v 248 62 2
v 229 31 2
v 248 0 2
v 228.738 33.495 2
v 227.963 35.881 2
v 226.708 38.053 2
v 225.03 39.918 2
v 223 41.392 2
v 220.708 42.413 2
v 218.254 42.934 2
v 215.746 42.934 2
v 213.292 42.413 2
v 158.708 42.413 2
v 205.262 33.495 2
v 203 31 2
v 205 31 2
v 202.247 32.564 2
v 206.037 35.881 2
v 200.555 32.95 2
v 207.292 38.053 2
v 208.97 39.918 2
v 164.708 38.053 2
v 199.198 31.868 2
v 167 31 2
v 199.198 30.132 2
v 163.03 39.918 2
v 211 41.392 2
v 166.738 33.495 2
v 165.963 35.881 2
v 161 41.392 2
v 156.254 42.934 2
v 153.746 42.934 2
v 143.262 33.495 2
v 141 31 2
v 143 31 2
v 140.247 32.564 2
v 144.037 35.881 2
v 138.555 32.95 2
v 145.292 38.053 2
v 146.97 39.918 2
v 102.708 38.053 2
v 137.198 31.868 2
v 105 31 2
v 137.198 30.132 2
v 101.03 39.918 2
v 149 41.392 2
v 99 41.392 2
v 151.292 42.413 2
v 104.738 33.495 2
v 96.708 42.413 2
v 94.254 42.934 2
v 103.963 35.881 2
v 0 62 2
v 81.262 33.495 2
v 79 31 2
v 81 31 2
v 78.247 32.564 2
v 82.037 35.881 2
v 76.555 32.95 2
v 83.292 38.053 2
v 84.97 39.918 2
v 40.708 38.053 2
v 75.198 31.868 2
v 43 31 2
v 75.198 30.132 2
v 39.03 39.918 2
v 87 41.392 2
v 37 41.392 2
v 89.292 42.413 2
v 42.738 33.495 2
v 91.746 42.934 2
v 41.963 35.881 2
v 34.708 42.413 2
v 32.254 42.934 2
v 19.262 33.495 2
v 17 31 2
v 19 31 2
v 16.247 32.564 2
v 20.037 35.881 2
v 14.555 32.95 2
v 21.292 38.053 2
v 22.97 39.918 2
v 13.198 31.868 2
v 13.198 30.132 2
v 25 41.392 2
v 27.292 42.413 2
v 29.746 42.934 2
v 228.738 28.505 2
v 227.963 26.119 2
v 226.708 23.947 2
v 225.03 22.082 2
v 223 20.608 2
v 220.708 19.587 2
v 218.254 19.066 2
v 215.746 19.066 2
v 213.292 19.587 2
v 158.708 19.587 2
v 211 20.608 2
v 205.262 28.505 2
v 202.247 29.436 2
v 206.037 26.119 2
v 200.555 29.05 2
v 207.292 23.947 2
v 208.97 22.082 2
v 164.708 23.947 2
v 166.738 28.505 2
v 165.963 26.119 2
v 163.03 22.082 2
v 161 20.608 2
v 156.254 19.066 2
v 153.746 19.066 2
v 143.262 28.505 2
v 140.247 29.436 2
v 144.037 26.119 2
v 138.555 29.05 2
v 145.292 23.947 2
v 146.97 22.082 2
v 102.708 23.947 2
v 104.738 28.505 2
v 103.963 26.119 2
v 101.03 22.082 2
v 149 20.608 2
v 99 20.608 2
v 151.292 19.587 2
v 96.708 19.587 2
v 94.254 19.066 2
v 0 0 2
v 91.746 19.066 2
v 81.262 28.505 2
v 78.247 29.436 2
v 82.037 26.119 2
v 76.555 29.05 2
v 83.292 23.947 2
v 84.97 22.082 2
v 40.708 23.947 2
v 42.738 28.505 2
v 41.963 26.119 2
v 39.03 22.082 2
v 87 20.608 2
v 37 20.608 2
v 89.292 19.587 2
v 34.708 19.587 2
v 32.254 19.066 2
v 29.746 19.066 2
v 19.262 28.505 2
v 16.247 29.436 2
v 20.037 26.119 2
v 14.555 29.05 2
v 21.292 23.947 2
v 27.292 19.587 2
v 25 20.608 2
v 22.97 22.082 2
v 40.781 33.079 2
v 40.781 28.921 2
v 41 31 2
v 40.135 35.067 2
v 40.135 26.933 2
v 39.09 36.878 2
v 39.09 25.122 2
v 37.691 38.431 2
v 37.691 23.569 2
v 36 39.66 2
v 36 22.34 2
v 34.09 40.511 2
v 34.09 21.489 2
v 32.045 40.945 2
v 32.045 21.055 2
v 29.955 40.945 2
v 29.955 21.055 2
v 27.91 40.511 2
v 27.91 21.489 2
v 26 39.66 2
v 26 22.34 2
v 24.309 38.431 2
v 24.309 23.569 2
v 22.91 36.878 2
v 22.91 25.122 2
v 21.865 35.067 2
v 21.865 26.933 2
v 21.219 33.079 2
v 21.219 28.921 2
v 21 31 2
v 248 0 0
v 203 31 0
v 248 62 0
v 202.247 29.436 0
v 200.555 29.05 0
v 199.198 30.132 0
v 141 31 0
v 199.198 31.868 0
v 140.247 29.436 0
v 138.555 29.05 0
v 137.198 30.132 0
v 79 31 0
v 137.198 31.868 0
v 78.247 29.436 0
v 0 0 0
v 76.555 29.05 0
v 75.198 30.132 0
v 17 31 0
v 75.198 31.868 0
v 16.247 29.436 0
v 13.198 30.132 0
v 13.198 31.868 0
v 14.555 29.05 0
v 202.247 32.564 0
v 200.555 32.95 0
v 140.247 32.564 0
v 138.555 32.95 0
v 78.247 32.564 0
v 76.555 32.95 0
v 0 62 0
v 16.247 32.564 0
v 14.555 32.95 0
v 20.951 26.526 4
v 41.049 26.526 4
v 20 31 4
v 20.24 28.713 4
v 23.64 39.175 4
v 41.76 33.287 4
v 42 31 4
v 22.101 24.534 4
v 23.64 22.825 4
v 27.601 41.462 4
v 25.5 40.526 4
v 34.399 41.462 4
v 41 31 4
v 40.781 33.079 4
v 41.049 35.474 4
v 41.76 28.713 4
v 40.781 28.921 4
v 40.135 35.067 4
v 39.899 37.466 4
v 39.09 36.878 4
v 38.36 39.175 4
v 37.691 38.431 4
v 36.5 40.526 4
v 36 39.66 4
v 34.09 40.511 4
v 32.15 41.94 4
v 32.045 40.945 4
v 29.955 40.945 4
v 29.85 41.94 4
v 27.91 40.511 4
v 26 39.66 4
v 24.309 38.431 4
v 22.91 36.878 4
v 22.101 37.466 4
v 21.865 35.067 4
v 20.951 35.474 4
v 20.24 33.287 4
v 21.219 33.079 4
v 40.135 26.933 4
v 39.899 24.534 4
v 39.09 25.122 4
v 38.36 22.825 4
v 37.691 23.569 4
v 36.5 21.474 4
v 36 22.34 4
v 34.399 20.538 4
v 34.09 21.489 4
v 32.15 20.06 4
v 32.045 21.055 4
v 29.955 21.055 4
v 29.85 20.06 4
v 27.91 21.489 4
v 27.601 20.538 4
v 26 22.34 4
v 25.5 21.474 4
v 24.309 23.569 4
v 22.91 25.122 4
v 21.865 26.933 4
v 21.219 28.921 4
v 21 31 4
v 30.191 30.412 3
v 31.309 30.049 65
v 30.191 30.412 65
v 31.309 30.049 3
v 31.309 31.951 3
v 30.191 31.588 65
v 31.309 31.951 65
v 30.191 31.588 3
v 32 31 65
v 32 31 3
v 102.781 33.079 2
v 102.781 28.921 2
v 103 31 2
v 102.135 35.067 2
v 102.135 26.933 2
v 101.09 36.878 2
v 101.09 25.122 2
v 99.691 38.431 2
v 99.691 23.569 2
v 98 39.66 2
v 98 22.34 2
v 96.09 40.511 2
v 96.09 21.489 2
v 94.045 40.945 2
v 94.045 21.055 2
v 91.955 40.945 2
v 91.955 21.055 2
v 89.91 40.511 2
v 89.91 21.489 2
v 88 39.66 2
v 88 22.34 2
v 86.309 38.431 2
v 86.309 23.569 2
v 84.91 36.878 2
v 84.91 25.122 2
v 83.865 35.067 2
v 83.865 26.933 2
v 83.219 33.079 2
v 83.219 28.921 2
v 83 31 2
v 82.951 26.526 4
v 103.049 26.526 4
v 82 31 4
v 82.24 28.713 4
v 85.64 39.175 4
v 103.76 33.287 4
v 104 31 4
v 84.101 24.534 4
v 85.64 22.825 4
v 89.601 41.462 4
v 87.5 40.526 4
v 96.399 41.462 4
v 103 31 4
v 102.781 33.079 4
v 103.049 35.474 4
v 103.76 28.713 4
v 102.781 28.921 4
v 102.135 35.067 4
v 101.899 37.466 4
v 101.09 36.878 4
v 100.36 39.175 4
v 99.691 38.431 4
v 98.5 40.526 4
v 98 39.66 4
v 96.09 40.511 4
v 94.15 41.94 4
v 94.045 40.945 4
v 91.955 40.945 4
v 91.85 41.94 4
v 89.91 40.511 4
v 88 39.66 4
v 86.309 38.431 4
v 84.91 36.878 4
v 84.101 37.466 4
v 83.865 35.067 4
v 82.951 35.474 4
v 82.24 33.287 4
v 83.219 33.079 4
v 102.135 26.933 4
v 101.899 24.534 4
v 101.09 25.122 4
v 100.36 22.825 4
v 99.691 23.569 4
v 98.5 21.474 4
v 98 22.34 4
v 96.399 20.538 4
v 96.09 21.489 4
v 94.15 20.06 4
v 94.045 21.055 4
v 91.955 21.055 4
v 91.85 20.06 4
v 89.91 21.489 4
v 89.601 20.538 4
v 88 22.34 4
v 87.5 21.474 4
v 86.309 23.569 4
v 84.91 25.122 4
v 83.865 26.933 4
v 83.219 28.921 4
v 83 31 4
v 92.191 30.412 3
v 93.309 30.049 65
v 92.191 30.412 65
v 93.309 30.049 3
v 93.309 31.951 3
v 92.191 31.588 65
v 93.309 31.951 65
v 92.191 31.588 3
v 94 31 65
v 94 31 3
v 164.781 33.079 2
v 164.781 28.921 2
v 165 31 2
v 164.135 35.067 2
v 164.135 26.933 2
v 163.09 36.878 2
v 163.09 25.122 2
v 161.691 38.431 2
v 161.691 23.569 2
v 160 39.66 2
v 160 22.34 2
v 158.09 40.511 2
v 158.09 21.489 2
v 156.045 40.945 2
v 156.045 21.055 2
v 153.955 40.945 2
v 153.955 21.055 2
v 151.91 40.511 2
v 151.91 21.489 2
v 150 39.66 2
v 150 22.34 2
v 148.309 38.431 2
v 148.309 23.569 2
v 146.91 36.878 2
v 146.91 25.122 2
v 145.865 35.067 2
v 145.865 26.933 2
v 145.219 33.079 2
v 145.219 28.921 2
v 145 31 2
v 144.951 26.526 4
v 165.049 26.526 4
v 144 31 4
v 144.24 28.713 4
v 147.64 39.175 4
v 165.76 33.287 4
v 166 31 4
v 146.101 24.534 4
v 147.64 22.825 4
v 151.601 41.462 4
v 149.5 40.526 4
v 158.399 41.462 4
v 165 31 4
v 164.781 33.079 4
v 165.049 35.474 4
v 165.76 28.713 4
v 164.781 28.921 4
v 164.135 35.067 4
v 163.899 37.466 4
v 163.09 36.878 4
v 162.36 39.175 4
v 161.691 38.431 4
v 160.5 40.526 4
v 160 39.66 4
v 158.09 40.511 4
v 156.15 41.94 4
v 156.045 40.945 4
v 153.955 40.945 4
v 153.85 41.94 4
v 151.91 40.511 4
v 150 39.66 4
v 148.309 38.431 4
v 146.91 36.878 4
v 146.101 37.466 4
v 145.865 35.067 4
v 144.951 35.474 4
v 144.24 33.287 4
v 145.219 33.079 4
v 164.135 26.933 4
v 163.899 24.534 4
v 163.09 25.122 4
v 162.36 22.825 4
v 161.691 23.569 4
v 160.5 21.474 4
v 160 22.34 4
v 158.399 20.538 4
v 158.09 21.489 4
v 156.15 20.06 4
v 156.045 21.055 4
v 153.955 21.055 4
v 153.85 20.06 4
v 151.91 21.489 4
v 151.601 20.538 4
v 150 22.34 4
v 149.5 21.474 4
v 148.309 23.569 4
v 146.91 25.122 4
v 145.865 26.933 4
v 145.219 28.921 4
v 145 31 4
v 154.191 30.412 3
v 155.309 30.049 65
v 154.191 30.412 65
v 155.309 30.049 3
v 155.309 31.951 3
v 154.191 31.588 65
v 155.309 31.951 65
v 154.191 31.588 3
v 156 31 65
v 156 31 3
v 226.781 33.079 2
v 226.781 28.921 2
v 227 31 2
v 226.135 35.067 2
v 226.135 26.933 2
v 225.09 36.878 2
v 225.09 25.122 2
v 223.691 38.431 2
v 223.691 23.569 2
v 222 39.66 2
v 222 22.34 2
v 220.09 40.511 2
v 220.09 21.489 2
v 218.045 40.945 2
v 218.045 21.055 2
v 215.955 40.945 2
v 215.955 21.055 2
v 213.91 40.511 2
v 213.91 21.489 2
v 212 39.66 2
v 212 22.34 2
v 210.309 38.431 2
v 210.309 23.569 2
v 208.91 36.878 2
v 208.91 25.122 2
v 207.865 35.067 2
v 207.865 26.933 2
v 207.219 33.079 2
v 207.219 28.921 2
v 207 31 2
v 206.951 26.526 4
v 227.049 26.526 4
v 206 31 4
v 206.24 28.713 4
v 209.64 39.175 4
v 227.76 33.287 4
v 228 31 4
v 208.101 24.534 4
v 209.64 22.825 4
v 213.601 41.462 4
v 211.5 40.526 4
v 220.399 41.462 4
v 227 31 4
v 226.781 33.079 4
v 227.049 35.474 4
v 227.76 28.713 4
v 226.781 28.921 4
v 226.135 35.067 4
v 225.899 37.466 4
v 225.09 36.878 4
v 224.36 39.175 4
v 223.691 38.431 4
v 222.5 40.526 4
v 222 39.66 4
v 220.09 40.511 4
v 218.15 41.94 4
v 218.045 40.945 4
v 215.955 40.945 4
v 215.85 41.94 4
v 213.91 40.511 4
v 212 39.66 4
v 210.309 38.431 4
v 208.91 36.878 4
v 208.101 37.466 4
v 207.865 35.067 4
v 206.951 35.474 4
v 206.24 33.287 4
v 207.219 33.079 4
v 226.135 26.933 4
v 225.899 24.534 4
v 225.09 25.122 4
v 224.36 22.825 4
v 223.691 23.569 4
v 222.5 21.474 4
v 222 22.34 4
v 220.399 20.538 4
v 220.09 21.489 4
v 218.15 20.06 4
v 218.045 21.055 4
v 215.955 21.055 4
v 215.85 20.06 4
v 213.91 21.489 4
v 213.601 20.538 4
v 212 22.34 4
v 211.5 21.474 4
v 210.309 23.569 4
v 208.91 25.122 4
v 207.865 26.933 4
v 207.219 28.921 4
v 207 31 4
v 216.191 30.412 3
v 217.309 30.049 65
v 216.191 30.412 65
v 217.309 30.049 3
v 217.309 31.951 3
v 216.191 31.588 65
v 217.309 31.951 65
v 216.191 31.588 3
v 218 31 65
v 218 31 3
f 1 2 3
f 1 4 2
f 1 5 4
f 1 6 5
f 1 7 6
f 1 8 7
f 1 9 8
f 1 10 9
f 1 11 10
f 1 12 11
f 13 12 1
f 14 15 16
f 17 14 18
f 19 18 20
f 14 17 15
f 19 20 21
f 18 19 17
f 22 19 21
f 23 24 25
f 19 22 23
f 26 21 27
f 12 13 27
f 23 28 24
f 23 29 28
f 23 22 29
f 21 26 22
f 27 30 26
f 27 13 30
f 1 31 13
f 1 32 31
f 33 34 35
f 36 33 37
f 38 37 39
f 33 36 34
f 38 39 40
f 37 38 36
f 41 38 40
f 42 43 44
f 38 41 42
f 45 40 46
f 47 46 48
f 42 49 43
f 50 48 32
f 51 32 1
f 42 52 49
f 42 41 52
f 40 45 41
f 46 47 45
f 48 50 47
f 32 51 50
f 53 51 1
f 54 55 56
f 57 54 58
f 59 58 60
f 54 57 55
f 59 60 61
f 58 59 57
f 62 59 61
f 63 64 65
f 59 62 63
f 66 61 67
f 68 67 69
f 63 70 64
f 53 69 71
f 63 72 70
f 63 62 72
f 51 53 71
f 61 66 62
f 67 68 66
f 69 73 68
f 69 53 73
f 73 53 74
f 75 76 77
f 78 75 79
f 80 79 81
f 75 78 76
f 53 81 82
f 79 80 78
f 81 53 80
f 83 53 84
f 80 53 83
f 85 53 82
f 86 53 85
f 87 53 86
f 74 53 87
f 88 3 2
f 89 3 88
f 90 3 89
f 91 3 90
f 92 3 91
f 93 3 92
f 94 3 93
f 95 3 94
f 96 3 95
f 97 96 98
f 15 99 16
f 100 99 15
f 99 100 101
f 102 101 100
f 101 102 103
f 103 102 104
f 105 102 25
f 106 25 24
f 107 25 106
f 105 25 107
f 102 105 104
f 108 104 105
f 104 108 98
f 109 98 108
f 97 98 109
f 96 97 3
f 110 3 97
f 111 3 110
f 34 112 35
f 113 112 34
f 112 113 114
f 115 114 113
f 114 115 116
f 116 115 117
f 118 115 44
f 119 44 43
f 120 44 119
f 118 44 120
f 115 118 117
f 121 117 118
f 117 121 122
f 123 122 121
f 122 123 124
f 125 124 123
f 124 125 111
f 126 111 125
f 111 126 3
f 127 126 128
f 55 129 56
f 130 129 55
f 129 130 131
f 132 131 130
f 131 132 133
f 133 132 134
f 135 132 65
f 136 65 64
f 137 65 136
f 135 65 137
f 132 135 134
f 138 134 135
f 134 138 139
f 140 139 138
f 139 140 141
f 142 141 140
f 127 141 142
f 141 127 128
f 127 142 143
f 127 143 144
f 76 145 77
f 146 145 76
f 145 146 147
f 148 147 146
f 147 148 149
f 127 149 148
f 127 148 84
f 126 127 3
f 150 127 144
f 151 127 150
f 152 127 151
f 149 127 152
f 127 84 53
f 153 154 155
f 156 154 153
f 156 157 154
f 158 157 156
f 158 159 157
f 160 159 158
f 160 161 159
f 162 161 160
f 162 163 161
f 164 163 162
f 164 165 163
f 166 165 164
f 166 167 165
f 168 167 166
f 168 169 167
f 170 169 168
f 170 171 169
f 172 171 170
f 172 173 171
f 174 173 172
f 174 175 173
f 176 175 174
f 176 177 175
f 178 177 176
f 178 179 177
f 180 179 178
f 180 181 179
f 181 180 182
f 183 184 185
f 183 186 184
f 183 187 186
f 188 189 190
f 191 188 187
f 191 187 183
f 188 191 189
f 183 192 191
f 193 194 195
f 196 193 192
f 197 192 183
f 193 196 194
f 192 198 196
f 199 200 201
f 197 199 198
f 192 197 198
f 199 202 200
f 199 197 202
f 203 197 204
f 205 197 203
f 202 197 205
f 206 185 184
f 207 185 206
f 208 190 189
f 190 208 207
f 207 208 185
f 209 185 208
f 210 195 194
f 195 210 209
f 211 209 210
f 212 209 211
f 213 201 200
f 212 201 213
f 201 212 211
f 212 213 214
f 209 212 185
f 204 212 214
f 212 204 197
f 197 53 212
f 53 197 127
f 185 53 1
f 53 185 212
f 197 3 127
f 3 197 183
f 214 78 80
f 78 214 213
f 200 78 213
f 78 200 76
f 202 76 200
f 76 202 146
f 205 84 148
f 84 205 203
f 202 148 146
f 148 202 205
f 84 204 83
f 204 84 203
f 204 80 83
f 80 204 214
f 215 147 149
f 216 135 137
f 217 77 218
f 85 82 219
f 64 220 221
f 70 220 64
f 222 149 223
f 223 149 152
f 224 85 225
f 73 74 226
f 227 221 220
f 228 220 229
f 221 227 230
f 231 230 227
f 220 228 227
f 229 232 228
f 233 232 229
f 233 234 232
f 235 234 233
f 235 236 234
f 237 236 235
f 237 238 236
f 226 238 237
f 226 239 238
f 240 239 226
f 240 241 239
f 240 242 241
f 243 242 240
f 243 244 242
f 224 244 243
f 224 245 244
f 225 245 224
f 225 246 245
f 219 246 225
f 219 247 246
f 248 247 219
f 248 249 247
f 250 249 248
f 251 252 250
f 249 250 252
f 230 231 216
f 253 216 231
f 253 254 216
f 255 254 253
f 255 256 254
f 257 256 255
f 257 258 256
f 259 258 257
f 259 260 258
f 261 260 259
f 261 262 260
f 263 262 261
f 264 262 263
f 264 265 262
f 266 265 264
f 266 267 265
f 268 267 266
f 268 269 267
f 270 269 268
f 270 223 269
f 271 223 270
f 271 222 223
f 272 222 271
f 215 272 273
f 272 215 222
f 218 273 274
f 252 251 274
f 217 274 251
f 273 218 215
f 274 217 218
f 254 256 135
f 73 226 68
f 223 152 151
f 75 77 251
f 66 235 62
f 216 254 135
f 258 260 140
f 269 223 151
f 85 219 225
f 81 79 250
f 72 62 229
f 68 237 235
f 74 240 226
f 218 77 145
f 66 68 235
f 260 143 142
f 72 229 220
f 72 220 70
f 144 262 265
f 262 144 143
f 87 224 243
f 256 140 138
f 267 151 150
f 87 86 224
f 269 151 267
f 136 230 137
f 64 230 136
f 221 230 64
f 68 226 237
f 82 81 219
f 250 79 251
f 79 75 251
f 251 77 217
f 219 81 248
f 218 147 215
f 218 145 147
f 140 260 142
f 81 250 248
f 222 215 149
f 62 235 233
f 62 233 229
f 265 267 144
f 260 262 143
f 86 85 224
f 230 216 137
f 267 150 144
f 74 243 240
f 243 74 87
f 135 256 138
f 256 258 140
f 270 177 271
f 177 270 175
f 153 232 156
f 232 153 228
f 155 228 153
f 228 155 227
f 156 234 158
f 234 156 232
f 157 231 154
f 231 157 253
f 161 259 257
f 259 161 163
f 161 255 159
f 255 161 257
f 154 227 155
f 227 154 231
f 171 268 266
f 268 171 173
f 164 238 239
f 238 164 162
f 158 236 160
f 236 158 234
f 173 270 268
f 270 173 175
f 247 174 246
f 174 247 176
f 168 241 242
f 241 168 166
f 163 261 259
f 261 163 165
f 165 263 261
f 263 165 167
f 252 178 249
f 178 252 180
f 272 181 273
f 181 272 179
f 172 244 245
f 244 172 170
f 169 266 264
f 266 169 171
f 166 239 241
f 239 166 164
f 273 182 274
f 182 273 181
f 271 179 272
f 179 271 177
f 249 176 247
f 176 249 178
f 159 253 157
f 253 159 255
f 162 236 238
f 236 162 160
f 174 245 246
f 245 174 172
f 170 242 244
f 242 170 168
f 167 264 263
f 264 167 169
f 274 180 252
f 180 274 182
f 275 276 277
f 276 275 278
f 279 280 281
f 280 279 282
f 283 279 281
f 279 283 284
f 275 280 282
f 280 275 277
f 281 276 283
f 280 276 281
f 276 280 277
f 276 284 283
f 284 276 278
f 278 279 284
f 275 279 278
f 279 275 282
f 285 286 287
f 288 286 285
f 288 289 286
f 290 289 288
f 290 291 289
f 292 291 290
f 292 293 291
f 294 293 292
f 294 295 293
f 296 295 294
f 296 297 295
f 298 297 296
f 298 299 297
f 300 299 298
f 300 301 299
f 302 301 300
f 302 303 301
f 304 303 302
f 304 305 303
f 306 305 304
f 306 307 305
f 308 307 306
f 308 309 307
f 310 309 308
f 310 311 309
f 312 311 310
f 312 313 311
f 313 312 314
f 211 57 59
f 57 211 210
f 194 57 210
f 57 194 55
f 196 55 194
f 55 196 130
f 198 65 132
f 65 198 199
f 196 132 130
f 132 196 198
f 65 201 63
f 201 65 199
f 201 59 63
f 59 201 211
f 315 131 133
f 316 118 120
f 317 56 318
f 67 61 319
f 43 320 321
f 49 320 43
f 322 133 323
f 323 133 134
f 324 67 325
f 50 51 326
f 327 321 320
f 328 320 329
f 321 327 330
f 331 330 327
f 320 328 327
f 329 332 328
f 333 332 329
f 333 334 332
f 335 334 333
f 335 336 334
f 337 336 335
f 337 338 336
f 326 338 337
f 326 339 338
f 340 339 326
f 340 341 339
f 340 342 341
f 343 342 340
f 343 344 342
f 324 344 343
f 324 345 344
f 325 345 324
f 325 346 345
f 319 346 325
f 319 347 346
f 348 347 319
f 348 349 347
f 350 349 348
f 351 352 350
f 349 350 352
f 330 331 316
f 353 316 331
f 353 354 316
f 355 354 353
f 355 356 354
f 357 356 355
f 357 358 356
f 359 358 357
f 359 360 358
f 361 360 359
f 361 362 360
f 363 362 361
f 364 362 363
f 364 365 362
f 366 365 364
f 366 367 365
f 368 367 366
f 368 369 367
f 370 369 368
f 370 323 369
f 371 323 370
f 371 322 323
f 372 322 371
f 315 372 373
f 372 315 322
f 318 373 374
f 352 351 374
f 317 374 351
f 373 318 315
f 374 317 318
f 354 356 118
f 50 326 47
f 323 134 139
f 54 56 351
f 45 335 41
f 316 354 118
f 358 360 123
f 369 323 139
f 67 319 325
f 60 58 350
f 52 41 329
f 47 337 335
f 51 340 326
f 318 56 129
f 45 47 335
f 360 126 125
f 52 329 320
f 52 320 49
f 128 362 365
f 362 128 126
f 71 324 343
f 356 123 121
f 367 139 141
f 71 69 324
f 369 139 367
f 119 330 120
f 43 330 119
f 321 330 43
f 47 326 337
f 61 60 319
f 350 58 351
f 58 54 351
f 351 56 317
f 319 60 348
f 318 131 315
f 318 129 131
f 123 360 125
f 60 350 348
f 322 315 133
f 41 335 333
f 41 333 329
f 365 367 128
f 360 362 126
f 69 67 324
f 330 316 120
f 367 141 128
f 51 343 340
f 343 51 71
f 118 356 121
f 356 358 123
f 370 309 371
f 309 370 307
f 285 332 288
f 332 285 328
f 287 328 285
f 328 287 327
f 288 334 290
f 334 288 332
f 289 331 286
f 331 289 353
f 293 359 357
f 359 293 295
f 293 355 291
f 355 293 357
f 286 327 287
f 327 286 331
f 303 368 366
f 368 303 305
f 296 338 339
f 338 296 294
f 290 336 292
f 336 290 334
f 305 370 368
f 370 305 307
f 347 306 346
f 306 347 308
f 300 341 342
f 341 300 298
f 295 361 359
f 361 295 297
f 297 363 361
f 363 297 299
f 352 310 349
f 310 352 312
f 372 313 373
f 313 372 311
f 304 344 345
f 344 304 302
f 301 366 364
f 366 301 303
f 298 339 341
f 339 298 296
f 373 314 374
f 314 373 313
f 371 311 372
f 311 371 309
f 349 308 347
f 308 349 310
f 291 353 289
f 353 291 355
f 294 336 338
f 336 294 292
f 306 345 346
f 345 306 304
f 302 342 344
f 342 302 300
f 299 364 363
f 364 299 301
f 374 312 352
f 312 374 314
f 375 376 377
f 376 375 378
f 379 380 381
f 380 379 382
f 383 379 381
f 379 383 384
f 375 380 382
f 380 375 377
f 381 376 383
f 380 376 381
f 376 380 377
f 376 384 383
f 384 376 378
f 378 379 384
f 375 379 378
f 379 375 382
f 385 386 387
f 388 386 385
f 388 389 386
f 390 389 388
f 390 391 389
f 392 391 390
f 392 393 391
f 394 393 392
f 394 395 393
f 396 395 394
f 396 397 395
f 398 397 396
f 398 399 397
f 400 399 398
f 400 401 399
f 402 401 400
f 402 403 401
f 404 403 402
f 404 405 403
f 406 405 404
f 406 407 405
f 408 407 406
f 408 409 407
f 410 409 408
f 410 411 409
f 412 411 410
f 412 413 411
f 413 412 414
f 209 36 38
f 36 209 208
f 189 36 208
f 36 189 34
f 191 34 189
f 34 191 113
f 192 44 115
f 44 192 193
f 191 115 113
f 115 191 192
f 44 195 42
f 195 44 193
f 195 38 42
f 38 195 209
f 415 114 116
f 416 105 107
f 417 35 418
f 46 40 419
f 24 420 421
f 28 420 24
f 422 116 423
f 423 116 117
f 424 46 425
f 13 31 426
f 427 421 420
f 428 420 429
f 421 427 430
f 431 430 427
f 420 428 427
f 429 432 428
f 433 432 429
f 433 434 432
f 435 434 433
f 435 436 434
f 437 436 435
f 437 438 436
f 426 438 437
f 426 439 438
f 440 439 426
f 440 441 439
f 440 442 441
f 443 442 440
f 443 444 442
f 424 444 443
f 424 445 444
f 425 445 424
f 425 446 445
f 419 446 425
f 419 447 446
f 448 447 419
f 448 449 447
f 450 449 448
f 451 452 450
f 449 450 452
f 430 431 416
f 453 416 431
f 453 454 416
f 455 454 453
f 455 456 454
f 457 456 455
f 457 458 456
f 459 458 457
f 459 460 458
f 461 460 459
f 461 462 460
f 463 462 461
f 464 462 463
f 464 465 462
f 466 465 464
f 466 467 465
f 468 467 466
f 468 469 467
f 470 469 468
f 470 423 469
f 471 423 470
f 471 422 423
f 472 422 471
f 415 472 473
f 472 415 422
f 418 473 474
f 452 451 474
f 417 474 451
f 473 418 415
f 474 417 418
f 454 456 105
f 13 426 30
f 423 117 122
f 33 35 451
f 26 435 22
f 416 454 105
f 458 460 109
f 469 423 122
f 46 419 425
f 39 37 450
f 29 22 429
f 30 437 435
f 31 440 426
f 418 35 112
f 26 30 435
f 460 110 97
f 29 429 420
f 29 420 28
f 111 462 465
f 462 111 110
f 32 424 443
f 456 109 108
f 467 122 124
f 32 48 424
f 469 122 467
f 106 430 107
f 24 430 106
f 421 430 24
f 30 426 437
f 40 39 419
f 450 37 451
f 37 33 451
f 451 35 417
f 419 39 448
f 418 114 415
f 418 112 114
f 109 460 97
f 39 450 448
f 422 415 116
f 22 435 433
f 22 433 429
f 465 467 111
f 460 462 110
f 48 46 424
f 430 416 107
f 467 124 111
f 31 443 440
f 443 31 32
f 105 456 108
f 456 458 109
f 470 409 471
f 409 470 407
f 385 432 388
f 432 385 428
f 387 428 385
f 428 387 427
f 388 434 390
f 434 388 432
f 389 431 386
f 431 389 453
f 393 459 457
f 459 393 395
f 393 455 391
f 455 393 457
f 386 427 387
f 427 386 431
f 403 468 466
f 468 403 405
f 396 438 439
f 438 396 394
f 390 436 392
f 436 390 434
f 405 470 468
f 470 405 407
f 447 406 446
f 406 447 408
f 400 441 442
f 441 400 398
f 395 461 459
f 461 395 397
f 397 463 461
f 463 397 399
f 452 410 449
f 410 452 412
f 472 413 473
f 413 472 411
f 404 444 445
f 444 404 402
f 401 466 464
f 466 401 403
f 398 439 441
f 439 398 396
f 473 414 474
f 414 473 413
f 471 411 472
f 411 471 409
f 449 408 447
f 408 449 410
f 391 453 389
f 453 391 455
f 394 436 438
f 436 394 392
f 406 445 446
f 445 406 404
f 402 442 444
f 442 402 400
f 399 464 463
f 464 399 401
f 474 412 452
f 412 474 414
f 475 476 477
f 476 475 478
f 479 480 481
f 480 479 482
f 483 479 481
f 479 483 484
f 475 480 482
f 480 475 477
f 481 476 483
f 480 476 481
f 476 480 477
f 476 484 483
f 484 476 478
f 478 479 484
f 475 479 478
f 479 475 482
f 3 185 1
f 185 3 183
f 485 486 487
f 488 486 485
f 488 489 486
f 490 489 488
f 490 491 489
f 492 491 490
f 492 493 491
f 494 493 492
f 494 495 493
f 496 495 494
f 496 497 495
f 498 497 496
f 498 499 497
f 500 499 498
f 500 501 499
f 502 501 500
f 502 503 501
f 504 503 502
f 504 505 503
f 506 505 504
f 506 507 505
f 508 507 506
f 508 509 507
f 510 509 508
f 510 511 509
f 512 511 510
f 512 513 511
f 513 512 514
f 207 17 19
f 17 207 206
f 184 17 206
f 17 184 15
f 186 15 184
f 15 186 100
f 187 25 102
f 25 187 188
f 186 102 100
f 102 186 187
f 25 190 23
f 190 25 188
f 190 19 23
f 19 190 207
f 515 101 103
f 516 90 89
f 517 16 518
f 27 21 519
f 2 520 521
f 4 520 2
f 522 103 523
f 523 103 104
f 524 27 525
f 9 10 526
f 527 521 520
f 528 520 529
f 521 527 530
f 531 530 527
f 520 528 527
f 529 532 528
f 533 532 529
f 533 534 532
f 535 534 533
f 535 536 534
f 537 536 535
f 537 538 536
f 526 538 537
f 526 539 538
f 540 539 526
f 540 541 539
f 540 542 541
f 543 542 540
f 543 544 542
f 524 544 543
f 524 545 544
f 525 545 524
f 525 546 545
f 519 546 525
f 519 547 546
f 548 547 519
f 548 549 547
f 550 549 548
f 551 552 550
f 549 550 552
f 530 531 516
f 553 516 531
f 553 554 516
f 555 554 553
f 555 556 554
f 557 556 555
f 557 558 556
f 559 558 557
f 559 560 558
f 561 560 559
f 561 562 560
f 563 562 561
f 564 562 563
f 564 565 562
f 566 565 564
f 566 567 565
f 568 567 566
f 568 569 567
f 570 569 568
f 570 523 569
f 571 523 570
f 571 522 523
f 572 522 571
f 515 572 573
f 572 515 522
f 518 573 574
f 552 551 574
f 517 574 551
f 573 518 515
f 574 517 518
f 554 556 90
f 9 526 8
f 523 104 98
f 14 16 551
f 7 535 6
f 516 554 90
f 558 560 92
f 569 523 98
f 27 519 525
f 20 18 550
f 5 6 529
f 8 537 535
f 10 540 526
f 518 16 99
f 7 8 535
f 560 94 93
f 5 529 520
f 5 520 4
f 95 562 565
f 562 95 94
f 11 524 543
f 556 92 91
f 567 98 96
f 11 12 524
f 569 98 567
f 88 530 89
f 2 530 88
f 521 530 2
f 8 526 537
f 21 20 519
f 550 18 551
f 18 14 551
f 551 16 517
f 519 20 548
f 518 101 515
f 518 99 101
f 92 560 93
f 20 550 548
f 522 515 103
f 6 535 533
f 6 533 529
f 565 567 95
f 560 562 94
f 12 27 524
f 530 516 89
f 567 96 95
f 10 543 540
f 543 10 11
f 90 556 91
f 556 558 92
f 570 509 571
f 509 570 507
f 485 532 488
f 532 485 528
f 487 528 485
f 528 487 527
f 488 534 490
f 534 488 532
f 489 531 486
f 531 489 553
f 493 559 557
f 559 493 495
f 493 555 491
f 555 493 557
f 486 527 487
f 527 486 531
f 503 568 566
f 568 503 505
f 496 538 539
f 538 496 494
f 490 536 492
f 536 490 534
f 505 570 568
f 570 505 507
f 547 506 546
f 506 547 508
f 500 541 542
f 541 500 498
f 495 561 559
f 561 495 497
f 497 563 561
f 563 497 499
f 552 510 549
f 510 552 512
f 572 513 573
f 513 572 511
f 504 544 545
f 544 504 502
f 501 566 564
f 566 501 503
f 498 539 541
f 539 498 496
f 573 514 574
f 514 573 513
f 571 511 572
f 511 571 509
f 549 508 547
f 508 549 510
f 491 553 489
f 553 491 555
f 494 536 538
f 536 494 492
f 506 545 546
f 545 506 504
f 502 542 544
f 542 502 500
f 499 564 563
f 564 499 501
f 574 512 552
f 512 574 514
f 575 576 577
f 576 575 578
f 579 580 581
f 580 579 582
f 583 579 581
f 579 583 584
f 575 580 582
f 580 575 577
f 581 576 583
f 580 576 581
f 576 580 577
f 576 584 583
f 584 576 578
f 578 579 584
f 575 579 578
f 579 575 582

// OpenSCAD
//   Bottlelift by gaziel for pierrelesek, Alnoa
//modified for Brian 

//   how many bottle in 1 line ?
Bottle_X=4; 

//   how many line of beer ?
Bottle_Y=1; 

//   caliper time !
Magnet_diameter=20;

//   62 for a standart 33cl beer bottle
Bottle_Diameter=62;

//no Fu$%ing low temp 3 m scotch .. no problem !
Screw="yes";//["yes","no"]

//   useless is the beterway, heuresement que j'ai pas arondis les coins comme un telephone de la pomme
Brian_revelation=1/1;//["amagod","xptdr"]


Thinkness=2;


module OneBelgianBeerPlease(){
    difference(){
        cube([Bottle_Diameter,Bottle_Diameter,Thinkness]);
            if (Screw=="yes"){
                translate([(Bottle_Diameter/2)-Magnet_diameter+Thinkness*2,Bottle_Diameter/2,0])cylinder(r=2,h=Thinkness);
            }
        }
        if (Brian_revelation==1){
            translate([Bottle_Diameter/2,Bottle_Diameter/2,Thinkness*1.5]) cylinder(d=Thinkness ,h=Bottle_Diameter);
        }
        translate([Bottle_Diameter/2,Bottle_Diameter/2,Thinkness*1.5]){
            difference(){
                cylinder(d1=Magnet_diameter+Thinkness*2,d2=Magnet_diameter+Thinkness,h=Thinkness,center=true);
                cylinder(d=Magnet_diameter,h=Thinkness+1,center=true);

            }
        }
    
}

for(j=[0,Bottle_Y-1]){
        for (i=[0:Bottle_X-1]){
            translate([i*Bottle_Diameter,j*Bottle_Diameter,0])OneBelgianBeerPlease(); 
        }
    }
    
    
